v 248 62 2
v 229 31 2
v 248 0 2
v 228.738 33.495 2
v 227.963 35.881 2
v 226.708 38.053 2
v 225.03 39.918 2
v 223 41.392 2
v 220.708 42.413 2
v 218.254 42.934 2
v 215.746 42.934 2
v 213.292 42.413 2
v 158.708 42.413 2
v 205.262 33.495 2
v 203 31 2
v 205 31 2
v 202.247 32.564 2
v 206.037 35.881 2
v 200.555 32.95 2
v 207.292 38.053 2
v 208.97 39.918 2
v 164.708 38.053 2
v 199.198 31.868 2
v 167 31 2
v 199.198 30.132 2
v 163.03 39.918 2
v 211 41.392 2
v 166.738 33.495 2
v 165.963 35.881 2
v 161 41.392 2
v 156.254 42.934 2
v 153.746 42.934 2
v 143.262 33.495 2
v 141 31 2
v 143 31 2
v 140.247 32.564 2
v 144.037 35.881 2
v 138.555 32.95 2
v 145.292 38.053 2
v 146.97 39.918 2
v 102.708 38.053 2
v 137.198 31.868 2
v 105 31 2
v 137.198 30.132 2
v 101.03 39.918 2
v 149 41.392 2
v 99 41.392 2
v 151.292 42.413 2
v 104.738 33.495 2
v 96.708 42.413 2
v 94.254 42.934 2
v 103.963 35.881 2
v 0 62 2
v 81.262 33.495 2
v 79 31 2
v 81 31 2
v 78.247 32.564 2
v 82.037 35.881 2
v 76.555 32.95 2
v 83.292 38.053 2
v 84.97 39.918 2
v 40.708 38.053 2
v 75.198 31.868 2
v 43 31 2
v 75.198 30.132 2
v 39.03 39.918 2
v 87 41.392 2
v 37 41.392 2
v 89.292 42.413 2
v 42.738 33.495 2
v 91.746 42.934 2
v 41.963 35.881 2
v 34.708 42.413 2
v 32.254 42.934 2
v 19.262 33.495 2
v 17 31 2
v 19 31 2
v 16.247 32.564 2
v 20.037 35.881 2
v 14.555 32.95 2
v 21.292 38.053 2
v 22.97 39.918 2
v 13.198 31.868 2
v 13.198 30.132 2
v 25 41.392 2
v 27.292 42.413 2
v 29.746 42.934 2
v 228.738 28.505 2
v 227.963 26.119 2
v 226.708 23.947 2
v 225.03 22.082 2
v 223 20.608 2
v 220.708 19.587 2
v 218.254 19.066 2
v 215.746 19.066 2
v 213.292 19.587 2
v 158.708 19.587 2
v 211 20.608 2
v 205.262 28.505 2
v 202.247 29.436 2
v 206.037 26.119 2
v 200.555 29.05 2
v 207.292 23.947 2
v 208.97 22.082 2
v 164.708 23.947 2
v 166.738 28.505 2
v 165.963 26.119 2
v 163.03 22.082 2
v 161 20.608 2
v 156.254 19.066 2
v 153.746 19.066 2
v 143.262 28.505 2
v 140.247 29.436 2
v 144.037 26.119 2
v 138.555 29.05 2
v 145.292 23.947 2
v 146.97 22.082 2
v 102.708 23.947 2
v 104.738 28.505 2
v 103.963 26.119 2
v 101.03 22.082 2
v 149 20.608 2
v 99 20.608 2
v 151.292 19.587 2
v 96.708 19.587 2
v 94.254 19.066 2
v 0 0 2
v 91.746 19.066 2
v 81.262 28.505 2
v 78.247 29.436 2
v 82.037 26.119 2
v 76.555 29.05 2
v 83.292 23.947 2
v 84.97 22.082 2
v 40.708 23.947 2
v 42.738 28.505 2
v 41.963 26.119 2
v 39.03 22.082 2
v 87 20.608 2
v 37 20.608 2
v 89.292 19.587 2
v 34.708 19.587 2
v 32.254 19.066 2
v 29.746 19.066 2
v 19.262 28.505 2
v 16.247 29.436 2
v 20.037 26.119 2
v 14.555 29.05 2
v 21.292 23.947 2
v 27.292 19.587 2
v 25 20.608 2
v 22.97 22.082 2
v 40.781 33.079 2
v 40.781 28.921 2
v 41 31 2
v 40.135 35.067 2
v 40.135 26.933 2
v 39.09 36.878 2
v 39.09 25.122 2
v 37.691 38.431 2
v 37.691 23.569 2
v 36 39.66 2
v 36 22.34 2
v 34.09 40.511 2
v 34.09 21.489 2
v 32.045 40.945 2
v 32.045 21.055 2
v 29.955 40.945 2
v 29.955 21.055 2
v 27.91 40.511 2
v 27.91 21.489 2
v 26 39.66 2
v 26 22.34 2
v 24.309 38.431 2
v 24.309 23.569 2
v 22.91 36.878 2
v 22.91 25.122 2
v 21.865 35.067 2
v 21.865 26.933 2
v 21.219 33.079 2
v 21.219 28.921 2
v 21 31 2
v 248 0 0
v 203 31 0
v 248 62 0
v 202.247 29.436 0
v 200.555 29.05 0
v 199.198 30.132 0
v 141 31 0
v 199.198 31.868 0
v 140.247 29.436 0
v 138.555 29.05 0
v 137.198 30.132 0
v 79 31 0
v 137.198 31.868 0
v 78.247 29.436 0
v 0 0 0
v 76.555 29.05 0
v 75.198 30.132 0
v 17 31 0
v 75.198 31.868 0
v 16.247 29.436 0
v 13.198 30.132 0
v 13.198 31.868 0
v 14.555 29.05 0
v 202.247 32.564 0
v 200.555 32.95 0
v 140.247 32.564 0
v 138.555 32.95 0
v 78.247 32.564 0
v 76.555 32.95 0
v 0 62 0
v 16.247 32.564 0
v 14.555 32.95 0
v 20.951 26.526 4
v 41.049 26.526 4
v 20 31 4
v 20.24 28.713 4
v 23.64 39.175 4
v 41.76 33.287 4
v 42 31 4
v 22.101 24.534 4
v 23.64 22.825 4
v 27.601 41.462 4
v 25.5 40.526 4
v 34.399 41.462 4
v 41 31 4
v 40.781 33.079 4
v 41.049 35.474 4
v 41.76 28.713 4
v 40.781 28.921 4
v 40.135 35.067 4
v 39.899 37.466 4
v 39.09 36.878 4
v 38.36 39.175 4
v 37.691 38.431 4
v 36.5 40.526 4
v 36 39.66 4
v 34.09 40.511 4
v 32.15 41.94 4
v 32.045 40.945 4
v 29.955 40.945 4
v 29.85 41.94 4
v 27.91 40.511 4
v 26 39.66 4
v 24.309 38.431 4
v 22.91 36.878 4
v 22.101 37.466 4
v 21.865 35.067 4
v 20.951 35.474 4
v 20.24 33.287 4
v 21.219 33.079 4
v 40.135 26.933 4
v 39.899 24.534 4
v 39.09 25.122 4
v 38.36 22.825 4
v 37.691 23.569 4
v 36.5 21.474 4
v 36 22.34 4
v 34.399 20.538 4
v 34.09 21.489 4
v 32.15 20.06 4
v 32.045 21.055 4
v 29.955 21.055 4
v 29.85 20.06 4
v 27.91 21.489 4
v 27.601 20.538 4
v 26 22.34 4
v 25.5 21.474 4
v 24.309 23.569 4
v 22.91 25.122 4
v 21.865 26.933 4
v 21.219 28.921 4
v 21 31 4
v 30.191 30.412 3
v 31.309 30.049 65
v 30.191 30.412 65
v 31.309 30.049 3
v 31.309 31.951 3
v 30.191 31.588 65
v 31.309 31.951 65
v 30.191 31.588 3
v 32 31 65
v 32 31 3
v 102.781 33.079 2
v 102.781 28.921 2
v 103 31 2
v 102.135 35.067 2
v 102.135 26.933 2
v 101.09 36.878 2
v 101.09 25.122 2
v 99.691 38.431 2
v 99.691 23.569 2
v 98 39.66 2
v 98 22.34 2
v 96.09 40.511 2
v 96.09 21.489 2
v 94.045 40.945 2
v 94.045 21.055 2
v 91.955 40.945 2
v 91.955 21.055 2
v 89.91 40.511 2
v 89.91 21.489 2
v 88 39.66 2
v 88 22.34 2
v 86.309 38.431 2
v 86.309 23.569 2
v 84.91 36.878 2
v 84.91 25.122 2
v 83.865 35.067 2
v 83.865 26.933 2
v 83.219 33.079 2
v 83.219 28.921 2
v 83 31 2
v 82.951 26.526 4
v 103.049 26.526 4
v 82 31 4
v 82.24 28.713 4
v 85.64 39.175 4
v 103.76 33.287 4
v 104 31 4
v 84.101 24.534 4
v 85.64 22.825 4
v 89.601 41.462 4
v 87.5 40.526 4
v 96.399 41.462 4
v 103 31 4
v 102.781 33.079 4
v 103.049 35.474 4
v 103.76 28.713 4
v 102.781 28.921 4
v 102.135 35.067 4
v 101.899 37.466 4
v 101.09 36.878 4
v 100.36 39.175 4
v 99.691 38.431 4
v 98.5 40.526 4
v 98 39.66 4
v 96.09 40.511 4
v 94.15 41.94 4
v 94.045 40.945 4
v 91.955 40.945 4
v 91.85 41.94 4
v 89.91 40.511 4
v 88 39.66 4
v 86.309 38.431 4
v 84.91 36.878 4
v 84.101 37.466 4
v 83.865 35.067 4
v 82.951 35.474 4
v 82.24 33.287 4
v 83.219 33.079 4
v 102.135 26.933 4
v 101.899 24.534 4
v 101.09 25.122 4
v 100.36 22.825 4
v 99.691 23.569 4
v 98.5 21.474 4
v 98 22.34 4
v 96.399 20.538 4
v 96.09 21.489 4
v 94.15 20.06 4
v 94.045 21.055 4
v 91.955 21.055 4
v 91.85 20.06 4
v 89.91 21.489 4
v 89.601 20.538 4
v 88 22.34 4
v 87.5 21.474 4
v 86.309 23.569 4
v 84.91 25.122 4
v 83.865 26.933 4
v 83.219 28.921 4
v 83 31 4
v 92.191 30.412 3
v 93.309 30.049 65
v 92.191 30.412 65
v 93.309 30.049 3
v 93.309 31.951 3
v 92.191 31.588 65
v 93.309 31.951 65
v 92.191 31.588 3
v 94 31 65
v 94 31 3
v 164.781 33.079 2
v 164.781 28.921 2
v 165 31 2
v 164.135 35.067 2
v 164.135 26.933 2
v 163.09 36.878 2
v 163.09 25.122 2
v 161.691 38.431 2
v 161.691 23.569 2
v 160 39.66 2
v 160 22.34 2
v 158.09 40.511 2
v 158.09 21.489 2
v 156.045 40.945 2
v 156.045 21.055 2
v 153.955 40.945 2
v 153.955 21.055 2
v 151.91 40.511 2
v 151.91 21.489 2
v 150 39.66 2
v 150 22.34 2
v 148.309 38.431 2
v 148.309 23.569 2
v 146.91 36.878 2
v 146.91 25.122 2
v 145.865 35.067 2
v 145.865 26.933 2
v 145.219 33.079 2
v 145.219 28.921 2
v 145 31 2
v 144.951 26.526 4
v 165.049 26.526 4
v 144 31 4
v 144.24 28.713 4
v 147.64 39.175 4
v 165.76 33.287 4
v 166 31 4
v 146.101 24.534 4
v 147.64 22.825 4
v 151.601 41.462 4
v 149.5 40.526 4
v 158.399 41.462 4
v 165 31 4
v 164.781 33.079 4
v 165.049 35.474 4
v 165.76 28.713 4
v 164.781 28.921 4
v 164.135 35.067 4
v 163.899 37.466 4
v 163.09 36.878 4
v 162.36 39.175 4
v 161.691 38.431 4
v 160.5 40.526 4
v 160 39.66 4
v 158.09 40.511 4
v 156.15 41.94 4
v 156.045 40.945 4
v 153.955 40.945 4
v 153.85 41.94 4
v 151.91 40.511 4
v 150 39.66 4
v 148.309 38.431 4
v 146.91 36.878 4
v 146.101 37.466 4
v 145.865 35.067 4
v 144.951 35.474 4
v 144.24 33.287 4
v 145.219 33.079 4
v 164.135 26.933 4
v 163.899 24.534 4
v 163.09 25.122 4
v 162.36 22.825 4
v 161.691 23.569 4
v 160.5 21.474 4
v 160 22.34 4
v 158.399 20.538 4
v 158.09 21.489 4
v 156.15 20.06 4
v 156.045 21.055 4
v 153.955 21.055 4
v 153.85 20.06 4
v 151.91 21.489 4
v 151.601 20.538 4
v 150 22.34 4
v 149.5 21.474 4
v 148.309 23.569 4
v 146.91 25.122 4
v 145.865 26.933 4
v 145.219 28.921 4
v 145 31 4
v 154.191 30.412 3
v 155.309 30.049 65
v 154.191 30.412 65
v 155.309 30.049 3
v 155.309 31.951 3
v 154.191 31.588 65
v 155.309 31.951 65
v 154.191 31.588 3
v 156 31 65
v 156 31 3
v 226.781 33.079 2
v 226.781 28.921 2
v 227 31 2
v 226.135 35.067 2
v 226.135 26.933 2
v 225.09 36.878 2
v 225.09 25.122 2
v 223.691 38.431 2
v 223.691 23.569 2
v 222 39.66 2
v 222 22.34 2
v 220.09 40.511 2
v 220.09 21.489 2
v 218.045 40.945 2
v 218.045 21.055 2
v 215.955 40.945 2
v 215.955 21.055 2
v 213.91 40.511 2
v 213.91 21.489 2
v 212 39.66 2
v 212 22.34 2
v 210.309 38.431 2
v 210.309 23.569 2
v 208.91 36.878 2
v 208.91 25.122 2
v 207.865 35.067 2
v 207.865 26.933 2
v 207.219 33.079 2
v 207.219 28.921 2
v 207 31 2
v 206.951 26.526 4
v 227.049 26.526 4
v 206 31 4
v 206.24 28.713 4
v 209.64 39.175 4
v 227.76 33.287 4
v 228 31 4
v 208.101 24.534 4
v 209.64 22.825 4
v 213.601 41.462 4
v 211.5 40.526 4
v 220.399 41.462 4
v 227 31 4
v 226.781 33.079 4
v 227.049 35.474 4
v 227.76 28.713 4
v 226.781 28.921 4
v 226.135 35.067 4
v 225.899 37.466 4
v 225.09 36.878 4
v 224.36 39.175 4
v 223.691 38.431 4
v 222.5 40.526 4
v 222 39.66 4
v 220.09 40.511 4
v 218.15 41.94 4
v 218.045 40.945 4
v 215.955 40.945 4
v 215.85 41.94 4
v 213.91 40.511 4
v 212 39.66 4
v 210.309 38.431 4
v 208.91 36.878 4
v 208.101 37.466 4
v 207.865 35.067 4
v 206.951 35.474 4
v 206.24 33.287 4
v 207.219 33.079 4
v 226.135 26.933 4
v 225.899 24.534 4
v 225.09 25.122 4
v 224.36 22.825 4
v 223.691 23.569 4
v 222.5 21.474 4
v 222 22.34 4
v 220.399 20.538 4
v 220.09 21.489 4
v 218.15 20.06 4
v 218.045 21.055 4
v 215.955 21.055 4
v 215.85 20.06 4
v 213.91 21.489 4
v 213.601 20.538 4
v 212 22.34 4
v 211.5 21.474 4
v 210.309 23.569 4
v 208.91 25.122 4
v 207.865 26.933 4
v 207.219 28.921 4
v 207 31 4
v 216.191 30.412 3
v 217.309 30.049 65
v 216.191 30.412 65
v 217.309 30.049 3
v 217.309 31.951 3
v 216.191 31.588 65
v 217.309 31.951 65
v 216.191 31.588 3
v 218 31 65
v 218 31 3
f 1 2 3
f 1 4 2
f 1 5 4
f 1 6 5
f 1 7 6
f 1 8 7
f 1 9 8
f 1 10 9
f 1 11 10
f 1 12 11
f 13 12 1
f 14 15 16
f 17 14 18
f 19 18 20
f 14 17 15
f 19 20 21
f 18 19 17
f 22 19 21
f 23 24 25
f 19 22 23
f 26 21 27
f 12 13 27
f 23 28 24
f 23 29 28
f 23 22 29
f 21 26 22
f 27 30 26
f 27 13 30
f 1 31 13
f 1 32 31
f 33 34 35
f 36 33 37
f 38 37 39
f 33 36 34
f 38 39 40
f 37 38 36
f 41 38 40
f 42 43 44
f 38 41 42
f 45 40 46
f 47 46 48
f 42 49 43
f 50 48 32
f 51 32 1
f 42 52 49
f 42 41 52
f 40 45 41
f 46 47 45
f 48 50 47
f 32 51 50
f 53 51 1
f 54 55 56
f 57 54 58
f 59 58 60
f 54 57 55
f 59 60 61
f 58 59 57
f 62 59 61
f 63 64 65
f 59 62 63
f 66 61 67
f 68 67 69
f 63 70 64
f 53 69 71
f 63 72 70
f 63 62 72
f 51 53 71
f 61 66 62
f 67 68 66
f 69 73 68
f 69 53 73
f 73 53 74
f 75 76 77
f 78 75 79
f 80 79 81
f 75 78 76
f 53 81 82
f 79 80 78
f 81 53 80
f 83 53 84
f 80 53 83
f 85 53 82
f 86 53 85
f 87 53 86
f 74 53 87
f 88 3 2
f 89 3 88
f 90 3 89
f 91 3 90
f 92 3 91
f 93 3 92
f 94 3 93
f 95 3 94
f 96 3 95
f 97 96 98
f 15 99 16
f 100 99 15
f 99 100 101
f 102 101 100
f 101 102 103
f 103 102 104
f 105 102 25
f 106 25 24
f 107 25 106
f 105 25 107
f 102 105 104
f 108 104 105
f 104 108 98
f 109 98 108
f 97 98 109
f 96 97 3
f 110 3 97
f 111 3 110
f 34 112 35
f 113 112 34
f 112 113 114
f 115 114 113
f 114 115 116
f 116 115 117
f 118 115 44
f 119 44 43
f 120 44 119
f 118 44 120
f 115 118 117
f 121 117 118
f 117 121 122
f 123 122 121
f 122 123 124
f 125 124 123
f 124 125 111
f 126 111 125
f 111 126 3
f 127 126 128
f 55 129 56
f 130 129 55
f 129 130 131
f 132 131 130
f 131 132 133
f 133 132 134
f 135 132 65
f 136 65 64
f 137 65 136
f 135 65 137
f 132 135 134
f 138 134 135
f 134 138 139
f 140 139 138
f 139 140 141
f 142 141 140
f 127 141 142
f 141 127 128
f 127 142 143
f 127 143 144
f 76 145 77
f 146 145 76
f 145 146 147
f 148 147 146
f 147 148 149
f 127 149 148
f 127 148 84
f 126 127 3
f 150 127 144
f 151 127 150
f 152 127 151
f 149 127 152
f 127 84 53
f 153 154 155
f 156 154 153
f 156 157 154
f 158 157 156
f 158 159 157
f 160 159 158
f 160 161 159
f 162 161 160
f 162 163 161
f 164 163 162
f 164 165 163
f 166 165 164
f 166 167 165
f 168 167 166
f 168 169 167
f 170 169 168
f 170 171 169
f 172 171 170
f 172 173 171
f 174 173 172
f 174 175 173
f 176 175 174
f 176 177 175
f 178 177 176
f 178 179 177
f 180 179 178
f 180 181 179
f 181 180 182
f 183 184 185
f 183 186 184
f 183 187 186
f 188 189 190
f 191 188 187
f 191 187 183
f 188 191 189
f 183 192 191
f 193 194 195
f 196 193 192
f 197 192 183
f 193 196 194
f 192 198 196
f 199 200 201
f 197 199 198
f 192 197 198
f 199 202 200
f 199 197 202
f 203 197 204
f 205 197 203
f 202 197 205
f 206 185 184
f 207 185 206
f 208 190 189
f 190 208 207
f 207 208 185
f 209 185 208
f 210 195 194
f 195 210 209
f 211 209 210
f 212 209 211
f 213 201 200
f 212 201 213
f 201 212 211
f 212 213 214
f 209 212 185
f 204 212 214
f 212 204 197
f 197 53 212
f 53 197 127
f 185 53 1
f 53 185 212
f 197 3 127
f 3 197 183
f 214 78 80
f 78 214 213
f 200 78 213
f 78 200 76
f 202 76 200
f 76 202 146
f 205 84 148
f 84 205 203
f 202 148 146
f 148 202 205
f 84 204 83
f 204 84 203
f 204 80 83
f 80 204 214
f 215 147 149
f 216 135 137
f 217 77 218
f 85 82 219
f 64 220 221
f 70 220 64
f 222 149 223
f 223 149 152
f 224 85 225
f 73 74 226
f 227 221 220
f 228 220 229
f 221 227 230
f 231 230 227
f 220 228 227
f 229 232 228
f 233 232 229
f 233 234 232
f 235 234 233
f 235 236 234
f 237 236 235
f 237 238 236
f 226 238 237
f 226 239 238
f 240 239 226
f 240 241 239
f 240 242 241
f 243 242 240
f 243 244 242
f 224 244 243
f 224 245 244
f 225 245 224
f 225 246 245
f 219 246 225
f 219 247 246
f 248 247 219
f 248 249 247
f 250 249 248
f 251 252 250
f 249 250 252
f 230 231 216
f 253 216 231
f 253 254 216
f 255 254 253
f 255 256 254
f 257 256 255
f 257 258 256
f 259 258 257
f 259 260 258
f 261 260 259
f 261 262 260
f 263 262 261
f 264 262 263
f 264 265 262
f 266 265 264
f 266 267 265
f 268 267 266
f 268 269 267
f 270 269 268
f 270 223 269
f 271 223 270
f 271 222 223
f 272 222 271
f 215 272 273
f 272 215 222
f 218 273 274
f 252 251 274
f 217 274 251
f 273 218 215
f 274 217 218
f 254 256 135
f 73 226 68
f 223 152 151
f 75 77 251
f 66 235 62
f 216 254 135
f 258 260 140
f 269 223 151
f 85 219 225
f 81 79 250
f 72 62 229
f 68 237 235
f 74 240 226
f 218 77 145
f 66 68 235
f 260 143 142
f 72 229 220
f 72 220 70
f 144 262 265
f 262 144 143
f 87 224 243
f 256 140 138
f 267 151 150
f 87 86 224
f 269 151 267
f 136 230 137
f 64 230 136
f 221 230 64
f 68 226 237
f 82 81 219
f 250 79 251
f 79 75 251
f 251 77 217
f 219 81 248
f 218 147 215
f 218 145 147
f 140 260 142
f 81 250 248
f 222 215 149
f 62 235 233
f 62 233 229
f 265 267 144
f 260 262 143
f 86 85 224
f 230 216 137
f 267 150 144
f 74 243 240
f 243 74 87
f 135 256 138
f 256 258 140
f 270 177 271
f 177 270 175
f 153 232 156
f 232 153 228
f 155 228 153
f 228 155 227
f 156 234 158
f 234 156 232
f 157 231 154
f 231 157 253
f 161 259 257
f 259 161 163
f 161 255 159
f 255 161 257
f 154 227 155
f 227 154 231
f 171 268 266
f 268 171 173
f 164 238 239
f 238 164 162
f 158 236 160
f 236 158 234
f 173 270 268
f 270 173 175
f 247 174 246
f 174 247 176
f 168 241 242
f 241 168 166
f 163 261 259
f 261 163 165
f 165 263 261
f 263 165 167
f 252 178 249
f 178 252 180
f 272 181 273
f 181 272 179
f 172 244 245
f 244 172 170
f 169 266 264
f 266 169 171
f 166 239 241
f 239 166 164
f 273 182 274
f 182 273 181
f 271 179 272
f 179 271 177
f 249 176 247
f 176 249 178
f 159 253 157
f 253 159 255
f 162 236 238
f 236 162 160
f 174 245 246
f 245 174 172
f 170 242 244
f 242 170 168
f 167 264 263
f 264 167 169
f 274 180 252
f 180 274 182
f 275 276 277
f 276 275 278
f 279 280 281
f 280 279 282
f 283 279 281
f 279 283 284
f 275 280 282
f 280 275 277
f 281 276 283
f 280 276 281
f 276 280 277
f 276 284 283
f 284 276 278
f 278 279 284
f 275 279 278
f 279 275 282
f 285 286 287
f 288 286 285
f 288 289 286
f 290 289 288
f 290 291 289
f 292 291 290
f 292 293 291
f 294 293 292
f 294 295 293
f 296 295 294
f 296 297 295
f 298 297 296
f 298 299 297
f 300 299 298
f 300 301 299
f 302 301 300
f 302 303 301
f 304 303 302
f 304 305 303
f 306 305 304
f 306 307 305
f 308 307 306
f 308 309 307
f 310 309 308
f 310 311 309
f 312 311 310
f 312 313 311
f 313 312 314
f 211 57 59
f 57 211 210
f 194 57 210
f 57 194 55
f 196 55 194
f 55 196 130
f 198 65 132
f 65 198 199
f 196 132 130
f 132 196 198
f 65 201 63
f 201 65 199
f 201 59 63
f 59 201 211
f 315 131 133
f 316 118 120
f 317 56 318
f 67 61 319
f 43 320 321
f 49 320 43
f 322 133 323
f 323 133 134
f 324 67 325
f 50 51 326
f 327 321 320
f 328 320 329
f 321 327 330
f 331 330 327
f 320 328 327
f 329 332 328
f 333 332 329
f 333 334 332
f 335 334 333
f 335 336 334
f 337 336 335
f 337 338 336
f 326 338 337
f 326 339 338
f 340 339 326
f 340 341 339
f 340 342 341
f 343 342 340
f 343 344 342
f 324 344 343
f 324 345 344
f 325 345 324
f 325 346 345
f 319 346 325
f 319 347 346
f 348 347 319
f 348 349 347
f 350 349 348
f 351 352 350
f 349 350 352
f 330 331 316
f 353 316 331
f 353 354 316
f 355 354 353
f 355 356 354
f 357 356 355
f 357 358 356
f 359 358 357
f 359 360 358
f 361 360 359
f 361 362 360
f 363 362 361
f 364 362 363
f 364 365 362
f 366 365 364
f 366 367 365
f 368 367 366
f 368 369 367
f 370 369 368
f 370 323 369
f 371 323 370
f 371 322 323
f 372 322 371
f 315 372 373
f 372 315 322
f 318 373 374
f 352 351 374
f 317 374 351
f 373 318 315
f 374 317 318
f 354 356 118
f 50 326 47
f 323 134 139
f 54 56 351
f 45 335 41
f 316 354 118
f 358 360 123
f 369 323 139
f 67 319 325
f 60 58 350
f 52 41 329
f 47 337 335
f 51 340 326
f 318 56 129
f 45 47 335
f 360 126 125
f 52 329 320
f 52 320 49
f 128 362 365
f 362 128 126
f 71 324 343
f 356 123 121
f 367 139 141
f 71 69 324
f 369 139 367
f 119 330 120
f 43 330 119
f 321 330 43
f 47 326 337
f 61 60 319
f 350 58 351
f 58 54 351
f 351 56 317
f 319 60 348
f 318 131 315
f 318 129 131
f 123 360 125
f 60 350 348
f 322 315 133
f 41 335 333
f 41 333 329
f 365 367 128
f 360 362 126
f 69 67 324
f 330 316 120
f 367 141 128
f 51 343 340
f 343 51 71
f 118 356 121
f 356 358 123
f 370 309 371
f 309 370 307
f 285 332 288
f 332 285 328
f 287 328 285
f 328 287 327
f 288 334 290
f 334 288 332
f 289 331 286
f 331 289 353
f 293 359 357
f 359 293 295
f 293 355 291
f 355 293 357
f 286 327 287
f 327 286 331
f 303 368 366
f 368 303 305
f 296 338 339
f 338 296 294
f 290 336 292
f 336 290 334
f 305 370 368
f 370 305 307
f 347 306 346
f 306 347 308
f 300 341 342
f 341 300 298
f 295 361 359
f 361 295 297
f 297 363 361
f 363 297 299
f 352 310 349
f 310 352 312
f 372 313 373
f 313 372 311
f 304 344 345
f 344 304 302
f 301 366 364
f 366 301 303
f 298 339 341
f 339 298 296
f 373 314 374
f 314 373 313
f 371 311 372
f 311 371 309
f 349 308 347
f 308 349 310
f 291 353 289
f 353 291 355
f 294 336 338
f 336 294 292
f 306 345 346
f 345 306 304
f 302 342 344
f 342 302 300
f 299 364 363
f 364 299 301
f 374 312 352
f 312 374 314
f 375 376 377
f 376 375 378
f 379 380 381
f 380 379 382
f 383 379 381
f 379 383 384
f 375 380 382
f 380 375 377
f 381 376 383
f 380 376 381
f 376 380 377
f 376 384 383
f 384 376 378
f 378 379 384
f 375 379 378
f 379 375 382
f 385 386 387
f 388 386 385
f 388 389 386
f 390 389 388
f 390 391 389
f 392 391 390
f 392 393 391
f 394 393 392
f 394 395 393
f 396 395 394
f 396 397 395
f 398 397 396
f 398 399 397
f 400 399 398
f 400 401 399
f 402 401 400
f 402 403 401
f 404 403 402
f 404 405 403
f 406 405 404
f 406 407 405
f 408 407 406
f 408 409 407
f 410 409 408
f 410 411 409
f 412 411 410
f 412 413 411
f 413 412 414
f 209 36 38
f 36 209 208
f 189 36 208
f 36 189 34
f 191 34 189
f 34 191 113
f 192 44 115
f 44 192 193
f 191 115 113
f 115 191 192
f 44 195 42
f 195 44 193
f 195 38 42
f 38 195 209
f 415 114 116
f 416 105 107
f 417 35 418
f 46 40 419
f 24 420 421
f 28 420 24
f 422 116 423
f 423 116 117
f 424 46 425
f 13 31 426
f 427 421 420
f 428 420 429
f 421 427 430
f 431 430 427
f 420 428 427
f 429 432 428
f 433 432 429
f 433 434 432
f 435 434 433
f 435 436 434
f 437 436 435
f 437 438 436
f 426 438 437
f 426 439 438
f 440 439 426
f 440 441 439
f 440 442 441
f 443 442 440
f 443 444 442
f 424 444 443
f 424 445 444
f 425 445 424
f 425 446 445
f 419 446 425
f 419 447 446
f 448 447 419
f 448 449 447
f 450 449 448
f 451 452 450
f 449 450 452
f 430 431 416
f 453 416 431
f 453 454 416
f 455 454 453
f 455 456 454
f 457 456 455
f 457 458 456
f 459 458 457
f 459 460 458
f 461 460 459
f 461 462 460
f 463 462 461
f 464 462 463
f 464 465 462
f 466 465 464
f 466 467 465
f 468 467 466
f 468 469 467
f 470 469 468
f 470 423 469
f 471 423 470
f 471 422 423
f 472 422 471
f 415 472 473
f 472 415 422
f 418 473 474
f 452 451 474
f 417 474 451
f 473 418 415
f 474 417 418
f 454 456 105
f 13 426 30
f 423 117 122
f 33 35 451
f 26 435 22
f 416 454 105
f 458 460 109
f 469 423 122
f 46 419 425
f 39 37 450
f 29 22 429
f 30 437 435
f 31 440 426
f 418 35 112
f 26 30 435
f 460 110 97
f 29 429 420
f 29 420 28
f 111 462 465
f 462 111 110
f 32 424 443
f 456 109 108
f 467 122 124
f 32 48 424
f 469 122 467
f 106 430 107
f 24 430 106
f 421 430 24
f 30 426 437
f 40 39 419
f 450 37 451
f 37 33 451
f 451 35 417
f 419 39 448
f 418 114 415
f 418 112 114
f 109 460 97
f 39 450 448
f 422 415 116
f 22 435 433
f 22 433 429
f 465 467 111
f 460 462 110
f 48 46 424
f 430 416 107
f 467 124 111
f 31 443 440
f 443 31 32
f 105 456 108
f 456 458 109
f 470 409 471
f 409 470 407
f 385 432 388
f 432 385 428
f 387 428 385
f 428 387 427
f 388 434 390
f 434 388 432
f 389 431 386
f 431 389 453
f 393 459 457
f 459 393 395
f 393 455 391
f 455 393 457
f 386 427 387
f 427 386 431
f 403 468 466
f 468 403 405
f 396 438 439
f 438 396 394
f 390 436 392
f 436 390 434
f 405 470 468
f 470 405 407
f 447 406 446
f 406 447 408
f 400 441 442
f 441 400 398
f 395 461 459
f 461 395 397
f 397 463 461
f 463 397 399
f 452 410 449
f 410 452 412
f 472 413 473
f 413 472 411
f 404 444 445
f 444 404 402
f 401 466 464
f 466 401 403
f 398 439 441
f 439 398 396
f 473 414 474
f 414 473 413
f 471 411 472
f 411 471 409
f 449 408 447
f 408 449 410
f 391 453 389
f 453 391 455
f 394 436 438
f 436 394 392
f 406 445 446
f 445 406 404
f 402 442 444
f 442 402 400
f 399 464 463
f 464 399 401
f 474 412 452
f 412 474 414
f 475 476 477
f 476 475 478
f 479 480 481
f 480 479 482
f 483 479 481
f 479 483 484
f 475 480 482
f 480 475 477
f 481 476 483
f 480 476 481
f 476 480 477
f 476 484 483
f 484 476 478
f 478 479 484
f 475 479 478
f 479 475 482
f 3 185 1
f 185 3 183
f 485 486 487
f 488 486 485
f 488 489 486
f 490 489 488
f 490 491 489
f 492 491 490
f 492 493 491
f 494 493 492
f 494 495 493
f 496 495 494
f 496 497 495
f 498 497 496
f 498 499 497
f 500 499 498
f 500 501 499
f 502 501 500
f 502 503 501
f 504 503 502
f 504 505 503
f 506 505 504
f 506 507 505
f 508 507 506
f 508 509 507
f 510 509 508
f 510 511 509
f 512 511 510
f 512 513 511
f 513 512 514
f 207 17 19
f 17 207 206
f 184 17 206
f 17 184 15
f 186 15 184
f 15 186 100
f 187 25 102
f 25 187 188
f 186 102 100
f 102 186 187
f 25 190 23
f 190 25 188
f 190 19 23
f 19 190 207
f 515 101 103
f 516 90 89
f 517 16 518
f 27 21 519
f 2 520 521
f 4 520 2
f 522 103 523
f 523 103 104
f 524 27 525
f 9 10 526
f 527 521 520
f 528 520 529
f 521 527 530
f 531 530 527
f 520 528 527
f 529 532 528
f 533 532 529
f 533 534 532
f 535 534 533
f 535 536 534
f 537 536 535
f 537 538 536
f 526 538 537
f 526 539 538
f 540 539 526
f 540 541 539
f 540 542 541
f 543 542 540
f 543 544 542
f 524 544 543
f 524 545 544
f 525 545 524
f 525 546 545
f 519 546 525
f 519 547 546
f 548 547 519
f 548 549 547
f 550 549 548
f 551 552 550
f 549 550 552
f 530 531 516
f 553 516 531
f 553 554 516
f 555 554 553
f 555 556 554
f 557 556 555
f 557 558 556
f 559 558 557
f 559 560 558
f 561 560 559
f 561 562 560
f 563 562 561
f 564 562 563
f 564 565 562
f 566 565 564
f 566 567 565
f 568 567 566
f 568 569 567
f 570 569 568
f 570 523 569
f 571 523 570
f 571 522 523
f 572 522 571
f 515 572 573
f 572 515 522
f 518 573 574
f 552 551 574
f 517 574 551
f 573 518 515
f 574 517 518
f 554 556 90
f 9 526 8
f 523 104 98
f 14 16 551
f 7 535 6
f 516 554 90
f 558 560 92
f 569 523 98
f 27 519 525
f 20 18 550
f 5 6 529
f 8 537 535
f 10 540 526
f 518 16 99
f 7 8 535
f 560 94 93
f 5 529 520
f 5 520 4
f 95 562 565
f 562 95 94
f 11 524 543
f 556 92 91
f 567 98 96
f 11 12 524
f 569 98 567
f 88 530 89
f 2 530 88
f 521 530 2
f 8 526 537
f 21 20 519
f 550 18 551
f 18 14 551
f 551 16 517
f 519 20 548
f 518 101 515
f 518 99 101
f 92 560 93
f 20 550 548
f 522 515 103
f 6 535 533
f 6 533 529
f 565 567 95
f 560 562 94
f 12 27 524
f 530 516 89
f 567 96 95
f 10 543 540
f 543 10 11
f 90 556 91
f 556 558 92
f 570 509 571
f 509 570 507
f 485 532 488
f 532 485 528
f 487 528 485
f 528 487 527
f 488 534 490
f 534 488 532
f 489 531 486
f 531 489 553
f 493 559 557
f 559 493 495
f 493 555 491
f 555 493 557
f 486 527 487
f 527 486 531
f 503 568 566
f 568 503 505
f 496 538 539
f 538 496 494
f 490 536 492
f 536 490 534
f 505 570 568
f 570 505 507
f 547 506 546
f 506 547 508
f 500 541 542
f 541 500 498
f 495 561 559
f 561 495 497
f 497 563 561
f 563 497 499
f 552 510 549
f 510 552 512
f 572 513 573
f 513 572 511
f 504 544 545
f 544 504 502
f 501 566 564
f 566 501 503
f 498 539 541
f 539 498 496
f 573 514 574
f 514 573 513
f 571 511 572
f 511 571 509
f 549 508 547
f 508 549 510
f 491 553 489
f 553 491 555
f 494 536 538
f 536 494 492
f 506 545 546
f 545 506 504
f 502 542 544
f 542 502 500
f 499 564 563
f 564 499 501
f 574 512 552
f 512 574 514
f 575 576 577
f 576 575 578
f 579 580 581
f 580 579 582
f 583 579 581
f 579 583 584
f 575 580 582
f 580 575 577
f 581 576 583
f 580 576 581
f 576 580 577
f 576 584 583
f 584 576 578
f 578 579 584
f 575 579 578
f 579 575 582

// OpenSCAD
//   Bottlelift by gaziel for pierrelesek, Alnoa
//modified for Brian 

//   how many bottle in 1 line ?
Bottle_X=4; 

//   how many line of beer ?
Bottle_Y=1; 

//   caliper time !
Magnet_diameter=20;

//   62 for a standart 33cl beer bottle
Bottle_Diameter=62;

//no Fu$%ing low temp 3 m scotch .. no problem !
Screw="yes";//["yes","no"]

//   useless is the beterway, heuresement que j'ai pas arondis les coins comme un telephone de la pomme
Brian_revelation=1/1;//["amagod","xptdr"]


Thinkness=2;


module OneBelgianBeerPlease(){
    difference(){
        cube([Bottle_Diameter,Bottle_Diameter,Thinkness]);
            if (Screw=="yes"){
                translate([(Bottle_Diameter/2)-Magnet_diameter+Thinkness*2,Bottle_Diameter/2,0])cylinder(r=2,h=Thinkness);
            }
        }
        if (Brian_revelation==1){
            translate([Bottle_Diameter/2,Bottle_Diameter/2,Thinkness*1.5]) cylinder(d=Thinkness ,h=Bottle_Diameter);
        }
        translate([Bottle_Diameter/2,Bottle_Diameter/2,Thinkness*1.5]){
            difference(){
                cylinder(d1=Magnet_diameter+Thinkness*2,d2=Magnet_diameter+Thinkness,h=Thinkness,center=true);
                cylinder(d=Magnet_diameter,h=Thinkness+1,center=true);

            }
        }
    
}

for(j=[0,Bottle_Y-1]){
        for (i=[0:Bottle_X-1]){
            translate([i*Bottle_Diameter,j*Bottle_Diameter,0])OneBelgianBeerPlease(); 
        }
    }
    
    
